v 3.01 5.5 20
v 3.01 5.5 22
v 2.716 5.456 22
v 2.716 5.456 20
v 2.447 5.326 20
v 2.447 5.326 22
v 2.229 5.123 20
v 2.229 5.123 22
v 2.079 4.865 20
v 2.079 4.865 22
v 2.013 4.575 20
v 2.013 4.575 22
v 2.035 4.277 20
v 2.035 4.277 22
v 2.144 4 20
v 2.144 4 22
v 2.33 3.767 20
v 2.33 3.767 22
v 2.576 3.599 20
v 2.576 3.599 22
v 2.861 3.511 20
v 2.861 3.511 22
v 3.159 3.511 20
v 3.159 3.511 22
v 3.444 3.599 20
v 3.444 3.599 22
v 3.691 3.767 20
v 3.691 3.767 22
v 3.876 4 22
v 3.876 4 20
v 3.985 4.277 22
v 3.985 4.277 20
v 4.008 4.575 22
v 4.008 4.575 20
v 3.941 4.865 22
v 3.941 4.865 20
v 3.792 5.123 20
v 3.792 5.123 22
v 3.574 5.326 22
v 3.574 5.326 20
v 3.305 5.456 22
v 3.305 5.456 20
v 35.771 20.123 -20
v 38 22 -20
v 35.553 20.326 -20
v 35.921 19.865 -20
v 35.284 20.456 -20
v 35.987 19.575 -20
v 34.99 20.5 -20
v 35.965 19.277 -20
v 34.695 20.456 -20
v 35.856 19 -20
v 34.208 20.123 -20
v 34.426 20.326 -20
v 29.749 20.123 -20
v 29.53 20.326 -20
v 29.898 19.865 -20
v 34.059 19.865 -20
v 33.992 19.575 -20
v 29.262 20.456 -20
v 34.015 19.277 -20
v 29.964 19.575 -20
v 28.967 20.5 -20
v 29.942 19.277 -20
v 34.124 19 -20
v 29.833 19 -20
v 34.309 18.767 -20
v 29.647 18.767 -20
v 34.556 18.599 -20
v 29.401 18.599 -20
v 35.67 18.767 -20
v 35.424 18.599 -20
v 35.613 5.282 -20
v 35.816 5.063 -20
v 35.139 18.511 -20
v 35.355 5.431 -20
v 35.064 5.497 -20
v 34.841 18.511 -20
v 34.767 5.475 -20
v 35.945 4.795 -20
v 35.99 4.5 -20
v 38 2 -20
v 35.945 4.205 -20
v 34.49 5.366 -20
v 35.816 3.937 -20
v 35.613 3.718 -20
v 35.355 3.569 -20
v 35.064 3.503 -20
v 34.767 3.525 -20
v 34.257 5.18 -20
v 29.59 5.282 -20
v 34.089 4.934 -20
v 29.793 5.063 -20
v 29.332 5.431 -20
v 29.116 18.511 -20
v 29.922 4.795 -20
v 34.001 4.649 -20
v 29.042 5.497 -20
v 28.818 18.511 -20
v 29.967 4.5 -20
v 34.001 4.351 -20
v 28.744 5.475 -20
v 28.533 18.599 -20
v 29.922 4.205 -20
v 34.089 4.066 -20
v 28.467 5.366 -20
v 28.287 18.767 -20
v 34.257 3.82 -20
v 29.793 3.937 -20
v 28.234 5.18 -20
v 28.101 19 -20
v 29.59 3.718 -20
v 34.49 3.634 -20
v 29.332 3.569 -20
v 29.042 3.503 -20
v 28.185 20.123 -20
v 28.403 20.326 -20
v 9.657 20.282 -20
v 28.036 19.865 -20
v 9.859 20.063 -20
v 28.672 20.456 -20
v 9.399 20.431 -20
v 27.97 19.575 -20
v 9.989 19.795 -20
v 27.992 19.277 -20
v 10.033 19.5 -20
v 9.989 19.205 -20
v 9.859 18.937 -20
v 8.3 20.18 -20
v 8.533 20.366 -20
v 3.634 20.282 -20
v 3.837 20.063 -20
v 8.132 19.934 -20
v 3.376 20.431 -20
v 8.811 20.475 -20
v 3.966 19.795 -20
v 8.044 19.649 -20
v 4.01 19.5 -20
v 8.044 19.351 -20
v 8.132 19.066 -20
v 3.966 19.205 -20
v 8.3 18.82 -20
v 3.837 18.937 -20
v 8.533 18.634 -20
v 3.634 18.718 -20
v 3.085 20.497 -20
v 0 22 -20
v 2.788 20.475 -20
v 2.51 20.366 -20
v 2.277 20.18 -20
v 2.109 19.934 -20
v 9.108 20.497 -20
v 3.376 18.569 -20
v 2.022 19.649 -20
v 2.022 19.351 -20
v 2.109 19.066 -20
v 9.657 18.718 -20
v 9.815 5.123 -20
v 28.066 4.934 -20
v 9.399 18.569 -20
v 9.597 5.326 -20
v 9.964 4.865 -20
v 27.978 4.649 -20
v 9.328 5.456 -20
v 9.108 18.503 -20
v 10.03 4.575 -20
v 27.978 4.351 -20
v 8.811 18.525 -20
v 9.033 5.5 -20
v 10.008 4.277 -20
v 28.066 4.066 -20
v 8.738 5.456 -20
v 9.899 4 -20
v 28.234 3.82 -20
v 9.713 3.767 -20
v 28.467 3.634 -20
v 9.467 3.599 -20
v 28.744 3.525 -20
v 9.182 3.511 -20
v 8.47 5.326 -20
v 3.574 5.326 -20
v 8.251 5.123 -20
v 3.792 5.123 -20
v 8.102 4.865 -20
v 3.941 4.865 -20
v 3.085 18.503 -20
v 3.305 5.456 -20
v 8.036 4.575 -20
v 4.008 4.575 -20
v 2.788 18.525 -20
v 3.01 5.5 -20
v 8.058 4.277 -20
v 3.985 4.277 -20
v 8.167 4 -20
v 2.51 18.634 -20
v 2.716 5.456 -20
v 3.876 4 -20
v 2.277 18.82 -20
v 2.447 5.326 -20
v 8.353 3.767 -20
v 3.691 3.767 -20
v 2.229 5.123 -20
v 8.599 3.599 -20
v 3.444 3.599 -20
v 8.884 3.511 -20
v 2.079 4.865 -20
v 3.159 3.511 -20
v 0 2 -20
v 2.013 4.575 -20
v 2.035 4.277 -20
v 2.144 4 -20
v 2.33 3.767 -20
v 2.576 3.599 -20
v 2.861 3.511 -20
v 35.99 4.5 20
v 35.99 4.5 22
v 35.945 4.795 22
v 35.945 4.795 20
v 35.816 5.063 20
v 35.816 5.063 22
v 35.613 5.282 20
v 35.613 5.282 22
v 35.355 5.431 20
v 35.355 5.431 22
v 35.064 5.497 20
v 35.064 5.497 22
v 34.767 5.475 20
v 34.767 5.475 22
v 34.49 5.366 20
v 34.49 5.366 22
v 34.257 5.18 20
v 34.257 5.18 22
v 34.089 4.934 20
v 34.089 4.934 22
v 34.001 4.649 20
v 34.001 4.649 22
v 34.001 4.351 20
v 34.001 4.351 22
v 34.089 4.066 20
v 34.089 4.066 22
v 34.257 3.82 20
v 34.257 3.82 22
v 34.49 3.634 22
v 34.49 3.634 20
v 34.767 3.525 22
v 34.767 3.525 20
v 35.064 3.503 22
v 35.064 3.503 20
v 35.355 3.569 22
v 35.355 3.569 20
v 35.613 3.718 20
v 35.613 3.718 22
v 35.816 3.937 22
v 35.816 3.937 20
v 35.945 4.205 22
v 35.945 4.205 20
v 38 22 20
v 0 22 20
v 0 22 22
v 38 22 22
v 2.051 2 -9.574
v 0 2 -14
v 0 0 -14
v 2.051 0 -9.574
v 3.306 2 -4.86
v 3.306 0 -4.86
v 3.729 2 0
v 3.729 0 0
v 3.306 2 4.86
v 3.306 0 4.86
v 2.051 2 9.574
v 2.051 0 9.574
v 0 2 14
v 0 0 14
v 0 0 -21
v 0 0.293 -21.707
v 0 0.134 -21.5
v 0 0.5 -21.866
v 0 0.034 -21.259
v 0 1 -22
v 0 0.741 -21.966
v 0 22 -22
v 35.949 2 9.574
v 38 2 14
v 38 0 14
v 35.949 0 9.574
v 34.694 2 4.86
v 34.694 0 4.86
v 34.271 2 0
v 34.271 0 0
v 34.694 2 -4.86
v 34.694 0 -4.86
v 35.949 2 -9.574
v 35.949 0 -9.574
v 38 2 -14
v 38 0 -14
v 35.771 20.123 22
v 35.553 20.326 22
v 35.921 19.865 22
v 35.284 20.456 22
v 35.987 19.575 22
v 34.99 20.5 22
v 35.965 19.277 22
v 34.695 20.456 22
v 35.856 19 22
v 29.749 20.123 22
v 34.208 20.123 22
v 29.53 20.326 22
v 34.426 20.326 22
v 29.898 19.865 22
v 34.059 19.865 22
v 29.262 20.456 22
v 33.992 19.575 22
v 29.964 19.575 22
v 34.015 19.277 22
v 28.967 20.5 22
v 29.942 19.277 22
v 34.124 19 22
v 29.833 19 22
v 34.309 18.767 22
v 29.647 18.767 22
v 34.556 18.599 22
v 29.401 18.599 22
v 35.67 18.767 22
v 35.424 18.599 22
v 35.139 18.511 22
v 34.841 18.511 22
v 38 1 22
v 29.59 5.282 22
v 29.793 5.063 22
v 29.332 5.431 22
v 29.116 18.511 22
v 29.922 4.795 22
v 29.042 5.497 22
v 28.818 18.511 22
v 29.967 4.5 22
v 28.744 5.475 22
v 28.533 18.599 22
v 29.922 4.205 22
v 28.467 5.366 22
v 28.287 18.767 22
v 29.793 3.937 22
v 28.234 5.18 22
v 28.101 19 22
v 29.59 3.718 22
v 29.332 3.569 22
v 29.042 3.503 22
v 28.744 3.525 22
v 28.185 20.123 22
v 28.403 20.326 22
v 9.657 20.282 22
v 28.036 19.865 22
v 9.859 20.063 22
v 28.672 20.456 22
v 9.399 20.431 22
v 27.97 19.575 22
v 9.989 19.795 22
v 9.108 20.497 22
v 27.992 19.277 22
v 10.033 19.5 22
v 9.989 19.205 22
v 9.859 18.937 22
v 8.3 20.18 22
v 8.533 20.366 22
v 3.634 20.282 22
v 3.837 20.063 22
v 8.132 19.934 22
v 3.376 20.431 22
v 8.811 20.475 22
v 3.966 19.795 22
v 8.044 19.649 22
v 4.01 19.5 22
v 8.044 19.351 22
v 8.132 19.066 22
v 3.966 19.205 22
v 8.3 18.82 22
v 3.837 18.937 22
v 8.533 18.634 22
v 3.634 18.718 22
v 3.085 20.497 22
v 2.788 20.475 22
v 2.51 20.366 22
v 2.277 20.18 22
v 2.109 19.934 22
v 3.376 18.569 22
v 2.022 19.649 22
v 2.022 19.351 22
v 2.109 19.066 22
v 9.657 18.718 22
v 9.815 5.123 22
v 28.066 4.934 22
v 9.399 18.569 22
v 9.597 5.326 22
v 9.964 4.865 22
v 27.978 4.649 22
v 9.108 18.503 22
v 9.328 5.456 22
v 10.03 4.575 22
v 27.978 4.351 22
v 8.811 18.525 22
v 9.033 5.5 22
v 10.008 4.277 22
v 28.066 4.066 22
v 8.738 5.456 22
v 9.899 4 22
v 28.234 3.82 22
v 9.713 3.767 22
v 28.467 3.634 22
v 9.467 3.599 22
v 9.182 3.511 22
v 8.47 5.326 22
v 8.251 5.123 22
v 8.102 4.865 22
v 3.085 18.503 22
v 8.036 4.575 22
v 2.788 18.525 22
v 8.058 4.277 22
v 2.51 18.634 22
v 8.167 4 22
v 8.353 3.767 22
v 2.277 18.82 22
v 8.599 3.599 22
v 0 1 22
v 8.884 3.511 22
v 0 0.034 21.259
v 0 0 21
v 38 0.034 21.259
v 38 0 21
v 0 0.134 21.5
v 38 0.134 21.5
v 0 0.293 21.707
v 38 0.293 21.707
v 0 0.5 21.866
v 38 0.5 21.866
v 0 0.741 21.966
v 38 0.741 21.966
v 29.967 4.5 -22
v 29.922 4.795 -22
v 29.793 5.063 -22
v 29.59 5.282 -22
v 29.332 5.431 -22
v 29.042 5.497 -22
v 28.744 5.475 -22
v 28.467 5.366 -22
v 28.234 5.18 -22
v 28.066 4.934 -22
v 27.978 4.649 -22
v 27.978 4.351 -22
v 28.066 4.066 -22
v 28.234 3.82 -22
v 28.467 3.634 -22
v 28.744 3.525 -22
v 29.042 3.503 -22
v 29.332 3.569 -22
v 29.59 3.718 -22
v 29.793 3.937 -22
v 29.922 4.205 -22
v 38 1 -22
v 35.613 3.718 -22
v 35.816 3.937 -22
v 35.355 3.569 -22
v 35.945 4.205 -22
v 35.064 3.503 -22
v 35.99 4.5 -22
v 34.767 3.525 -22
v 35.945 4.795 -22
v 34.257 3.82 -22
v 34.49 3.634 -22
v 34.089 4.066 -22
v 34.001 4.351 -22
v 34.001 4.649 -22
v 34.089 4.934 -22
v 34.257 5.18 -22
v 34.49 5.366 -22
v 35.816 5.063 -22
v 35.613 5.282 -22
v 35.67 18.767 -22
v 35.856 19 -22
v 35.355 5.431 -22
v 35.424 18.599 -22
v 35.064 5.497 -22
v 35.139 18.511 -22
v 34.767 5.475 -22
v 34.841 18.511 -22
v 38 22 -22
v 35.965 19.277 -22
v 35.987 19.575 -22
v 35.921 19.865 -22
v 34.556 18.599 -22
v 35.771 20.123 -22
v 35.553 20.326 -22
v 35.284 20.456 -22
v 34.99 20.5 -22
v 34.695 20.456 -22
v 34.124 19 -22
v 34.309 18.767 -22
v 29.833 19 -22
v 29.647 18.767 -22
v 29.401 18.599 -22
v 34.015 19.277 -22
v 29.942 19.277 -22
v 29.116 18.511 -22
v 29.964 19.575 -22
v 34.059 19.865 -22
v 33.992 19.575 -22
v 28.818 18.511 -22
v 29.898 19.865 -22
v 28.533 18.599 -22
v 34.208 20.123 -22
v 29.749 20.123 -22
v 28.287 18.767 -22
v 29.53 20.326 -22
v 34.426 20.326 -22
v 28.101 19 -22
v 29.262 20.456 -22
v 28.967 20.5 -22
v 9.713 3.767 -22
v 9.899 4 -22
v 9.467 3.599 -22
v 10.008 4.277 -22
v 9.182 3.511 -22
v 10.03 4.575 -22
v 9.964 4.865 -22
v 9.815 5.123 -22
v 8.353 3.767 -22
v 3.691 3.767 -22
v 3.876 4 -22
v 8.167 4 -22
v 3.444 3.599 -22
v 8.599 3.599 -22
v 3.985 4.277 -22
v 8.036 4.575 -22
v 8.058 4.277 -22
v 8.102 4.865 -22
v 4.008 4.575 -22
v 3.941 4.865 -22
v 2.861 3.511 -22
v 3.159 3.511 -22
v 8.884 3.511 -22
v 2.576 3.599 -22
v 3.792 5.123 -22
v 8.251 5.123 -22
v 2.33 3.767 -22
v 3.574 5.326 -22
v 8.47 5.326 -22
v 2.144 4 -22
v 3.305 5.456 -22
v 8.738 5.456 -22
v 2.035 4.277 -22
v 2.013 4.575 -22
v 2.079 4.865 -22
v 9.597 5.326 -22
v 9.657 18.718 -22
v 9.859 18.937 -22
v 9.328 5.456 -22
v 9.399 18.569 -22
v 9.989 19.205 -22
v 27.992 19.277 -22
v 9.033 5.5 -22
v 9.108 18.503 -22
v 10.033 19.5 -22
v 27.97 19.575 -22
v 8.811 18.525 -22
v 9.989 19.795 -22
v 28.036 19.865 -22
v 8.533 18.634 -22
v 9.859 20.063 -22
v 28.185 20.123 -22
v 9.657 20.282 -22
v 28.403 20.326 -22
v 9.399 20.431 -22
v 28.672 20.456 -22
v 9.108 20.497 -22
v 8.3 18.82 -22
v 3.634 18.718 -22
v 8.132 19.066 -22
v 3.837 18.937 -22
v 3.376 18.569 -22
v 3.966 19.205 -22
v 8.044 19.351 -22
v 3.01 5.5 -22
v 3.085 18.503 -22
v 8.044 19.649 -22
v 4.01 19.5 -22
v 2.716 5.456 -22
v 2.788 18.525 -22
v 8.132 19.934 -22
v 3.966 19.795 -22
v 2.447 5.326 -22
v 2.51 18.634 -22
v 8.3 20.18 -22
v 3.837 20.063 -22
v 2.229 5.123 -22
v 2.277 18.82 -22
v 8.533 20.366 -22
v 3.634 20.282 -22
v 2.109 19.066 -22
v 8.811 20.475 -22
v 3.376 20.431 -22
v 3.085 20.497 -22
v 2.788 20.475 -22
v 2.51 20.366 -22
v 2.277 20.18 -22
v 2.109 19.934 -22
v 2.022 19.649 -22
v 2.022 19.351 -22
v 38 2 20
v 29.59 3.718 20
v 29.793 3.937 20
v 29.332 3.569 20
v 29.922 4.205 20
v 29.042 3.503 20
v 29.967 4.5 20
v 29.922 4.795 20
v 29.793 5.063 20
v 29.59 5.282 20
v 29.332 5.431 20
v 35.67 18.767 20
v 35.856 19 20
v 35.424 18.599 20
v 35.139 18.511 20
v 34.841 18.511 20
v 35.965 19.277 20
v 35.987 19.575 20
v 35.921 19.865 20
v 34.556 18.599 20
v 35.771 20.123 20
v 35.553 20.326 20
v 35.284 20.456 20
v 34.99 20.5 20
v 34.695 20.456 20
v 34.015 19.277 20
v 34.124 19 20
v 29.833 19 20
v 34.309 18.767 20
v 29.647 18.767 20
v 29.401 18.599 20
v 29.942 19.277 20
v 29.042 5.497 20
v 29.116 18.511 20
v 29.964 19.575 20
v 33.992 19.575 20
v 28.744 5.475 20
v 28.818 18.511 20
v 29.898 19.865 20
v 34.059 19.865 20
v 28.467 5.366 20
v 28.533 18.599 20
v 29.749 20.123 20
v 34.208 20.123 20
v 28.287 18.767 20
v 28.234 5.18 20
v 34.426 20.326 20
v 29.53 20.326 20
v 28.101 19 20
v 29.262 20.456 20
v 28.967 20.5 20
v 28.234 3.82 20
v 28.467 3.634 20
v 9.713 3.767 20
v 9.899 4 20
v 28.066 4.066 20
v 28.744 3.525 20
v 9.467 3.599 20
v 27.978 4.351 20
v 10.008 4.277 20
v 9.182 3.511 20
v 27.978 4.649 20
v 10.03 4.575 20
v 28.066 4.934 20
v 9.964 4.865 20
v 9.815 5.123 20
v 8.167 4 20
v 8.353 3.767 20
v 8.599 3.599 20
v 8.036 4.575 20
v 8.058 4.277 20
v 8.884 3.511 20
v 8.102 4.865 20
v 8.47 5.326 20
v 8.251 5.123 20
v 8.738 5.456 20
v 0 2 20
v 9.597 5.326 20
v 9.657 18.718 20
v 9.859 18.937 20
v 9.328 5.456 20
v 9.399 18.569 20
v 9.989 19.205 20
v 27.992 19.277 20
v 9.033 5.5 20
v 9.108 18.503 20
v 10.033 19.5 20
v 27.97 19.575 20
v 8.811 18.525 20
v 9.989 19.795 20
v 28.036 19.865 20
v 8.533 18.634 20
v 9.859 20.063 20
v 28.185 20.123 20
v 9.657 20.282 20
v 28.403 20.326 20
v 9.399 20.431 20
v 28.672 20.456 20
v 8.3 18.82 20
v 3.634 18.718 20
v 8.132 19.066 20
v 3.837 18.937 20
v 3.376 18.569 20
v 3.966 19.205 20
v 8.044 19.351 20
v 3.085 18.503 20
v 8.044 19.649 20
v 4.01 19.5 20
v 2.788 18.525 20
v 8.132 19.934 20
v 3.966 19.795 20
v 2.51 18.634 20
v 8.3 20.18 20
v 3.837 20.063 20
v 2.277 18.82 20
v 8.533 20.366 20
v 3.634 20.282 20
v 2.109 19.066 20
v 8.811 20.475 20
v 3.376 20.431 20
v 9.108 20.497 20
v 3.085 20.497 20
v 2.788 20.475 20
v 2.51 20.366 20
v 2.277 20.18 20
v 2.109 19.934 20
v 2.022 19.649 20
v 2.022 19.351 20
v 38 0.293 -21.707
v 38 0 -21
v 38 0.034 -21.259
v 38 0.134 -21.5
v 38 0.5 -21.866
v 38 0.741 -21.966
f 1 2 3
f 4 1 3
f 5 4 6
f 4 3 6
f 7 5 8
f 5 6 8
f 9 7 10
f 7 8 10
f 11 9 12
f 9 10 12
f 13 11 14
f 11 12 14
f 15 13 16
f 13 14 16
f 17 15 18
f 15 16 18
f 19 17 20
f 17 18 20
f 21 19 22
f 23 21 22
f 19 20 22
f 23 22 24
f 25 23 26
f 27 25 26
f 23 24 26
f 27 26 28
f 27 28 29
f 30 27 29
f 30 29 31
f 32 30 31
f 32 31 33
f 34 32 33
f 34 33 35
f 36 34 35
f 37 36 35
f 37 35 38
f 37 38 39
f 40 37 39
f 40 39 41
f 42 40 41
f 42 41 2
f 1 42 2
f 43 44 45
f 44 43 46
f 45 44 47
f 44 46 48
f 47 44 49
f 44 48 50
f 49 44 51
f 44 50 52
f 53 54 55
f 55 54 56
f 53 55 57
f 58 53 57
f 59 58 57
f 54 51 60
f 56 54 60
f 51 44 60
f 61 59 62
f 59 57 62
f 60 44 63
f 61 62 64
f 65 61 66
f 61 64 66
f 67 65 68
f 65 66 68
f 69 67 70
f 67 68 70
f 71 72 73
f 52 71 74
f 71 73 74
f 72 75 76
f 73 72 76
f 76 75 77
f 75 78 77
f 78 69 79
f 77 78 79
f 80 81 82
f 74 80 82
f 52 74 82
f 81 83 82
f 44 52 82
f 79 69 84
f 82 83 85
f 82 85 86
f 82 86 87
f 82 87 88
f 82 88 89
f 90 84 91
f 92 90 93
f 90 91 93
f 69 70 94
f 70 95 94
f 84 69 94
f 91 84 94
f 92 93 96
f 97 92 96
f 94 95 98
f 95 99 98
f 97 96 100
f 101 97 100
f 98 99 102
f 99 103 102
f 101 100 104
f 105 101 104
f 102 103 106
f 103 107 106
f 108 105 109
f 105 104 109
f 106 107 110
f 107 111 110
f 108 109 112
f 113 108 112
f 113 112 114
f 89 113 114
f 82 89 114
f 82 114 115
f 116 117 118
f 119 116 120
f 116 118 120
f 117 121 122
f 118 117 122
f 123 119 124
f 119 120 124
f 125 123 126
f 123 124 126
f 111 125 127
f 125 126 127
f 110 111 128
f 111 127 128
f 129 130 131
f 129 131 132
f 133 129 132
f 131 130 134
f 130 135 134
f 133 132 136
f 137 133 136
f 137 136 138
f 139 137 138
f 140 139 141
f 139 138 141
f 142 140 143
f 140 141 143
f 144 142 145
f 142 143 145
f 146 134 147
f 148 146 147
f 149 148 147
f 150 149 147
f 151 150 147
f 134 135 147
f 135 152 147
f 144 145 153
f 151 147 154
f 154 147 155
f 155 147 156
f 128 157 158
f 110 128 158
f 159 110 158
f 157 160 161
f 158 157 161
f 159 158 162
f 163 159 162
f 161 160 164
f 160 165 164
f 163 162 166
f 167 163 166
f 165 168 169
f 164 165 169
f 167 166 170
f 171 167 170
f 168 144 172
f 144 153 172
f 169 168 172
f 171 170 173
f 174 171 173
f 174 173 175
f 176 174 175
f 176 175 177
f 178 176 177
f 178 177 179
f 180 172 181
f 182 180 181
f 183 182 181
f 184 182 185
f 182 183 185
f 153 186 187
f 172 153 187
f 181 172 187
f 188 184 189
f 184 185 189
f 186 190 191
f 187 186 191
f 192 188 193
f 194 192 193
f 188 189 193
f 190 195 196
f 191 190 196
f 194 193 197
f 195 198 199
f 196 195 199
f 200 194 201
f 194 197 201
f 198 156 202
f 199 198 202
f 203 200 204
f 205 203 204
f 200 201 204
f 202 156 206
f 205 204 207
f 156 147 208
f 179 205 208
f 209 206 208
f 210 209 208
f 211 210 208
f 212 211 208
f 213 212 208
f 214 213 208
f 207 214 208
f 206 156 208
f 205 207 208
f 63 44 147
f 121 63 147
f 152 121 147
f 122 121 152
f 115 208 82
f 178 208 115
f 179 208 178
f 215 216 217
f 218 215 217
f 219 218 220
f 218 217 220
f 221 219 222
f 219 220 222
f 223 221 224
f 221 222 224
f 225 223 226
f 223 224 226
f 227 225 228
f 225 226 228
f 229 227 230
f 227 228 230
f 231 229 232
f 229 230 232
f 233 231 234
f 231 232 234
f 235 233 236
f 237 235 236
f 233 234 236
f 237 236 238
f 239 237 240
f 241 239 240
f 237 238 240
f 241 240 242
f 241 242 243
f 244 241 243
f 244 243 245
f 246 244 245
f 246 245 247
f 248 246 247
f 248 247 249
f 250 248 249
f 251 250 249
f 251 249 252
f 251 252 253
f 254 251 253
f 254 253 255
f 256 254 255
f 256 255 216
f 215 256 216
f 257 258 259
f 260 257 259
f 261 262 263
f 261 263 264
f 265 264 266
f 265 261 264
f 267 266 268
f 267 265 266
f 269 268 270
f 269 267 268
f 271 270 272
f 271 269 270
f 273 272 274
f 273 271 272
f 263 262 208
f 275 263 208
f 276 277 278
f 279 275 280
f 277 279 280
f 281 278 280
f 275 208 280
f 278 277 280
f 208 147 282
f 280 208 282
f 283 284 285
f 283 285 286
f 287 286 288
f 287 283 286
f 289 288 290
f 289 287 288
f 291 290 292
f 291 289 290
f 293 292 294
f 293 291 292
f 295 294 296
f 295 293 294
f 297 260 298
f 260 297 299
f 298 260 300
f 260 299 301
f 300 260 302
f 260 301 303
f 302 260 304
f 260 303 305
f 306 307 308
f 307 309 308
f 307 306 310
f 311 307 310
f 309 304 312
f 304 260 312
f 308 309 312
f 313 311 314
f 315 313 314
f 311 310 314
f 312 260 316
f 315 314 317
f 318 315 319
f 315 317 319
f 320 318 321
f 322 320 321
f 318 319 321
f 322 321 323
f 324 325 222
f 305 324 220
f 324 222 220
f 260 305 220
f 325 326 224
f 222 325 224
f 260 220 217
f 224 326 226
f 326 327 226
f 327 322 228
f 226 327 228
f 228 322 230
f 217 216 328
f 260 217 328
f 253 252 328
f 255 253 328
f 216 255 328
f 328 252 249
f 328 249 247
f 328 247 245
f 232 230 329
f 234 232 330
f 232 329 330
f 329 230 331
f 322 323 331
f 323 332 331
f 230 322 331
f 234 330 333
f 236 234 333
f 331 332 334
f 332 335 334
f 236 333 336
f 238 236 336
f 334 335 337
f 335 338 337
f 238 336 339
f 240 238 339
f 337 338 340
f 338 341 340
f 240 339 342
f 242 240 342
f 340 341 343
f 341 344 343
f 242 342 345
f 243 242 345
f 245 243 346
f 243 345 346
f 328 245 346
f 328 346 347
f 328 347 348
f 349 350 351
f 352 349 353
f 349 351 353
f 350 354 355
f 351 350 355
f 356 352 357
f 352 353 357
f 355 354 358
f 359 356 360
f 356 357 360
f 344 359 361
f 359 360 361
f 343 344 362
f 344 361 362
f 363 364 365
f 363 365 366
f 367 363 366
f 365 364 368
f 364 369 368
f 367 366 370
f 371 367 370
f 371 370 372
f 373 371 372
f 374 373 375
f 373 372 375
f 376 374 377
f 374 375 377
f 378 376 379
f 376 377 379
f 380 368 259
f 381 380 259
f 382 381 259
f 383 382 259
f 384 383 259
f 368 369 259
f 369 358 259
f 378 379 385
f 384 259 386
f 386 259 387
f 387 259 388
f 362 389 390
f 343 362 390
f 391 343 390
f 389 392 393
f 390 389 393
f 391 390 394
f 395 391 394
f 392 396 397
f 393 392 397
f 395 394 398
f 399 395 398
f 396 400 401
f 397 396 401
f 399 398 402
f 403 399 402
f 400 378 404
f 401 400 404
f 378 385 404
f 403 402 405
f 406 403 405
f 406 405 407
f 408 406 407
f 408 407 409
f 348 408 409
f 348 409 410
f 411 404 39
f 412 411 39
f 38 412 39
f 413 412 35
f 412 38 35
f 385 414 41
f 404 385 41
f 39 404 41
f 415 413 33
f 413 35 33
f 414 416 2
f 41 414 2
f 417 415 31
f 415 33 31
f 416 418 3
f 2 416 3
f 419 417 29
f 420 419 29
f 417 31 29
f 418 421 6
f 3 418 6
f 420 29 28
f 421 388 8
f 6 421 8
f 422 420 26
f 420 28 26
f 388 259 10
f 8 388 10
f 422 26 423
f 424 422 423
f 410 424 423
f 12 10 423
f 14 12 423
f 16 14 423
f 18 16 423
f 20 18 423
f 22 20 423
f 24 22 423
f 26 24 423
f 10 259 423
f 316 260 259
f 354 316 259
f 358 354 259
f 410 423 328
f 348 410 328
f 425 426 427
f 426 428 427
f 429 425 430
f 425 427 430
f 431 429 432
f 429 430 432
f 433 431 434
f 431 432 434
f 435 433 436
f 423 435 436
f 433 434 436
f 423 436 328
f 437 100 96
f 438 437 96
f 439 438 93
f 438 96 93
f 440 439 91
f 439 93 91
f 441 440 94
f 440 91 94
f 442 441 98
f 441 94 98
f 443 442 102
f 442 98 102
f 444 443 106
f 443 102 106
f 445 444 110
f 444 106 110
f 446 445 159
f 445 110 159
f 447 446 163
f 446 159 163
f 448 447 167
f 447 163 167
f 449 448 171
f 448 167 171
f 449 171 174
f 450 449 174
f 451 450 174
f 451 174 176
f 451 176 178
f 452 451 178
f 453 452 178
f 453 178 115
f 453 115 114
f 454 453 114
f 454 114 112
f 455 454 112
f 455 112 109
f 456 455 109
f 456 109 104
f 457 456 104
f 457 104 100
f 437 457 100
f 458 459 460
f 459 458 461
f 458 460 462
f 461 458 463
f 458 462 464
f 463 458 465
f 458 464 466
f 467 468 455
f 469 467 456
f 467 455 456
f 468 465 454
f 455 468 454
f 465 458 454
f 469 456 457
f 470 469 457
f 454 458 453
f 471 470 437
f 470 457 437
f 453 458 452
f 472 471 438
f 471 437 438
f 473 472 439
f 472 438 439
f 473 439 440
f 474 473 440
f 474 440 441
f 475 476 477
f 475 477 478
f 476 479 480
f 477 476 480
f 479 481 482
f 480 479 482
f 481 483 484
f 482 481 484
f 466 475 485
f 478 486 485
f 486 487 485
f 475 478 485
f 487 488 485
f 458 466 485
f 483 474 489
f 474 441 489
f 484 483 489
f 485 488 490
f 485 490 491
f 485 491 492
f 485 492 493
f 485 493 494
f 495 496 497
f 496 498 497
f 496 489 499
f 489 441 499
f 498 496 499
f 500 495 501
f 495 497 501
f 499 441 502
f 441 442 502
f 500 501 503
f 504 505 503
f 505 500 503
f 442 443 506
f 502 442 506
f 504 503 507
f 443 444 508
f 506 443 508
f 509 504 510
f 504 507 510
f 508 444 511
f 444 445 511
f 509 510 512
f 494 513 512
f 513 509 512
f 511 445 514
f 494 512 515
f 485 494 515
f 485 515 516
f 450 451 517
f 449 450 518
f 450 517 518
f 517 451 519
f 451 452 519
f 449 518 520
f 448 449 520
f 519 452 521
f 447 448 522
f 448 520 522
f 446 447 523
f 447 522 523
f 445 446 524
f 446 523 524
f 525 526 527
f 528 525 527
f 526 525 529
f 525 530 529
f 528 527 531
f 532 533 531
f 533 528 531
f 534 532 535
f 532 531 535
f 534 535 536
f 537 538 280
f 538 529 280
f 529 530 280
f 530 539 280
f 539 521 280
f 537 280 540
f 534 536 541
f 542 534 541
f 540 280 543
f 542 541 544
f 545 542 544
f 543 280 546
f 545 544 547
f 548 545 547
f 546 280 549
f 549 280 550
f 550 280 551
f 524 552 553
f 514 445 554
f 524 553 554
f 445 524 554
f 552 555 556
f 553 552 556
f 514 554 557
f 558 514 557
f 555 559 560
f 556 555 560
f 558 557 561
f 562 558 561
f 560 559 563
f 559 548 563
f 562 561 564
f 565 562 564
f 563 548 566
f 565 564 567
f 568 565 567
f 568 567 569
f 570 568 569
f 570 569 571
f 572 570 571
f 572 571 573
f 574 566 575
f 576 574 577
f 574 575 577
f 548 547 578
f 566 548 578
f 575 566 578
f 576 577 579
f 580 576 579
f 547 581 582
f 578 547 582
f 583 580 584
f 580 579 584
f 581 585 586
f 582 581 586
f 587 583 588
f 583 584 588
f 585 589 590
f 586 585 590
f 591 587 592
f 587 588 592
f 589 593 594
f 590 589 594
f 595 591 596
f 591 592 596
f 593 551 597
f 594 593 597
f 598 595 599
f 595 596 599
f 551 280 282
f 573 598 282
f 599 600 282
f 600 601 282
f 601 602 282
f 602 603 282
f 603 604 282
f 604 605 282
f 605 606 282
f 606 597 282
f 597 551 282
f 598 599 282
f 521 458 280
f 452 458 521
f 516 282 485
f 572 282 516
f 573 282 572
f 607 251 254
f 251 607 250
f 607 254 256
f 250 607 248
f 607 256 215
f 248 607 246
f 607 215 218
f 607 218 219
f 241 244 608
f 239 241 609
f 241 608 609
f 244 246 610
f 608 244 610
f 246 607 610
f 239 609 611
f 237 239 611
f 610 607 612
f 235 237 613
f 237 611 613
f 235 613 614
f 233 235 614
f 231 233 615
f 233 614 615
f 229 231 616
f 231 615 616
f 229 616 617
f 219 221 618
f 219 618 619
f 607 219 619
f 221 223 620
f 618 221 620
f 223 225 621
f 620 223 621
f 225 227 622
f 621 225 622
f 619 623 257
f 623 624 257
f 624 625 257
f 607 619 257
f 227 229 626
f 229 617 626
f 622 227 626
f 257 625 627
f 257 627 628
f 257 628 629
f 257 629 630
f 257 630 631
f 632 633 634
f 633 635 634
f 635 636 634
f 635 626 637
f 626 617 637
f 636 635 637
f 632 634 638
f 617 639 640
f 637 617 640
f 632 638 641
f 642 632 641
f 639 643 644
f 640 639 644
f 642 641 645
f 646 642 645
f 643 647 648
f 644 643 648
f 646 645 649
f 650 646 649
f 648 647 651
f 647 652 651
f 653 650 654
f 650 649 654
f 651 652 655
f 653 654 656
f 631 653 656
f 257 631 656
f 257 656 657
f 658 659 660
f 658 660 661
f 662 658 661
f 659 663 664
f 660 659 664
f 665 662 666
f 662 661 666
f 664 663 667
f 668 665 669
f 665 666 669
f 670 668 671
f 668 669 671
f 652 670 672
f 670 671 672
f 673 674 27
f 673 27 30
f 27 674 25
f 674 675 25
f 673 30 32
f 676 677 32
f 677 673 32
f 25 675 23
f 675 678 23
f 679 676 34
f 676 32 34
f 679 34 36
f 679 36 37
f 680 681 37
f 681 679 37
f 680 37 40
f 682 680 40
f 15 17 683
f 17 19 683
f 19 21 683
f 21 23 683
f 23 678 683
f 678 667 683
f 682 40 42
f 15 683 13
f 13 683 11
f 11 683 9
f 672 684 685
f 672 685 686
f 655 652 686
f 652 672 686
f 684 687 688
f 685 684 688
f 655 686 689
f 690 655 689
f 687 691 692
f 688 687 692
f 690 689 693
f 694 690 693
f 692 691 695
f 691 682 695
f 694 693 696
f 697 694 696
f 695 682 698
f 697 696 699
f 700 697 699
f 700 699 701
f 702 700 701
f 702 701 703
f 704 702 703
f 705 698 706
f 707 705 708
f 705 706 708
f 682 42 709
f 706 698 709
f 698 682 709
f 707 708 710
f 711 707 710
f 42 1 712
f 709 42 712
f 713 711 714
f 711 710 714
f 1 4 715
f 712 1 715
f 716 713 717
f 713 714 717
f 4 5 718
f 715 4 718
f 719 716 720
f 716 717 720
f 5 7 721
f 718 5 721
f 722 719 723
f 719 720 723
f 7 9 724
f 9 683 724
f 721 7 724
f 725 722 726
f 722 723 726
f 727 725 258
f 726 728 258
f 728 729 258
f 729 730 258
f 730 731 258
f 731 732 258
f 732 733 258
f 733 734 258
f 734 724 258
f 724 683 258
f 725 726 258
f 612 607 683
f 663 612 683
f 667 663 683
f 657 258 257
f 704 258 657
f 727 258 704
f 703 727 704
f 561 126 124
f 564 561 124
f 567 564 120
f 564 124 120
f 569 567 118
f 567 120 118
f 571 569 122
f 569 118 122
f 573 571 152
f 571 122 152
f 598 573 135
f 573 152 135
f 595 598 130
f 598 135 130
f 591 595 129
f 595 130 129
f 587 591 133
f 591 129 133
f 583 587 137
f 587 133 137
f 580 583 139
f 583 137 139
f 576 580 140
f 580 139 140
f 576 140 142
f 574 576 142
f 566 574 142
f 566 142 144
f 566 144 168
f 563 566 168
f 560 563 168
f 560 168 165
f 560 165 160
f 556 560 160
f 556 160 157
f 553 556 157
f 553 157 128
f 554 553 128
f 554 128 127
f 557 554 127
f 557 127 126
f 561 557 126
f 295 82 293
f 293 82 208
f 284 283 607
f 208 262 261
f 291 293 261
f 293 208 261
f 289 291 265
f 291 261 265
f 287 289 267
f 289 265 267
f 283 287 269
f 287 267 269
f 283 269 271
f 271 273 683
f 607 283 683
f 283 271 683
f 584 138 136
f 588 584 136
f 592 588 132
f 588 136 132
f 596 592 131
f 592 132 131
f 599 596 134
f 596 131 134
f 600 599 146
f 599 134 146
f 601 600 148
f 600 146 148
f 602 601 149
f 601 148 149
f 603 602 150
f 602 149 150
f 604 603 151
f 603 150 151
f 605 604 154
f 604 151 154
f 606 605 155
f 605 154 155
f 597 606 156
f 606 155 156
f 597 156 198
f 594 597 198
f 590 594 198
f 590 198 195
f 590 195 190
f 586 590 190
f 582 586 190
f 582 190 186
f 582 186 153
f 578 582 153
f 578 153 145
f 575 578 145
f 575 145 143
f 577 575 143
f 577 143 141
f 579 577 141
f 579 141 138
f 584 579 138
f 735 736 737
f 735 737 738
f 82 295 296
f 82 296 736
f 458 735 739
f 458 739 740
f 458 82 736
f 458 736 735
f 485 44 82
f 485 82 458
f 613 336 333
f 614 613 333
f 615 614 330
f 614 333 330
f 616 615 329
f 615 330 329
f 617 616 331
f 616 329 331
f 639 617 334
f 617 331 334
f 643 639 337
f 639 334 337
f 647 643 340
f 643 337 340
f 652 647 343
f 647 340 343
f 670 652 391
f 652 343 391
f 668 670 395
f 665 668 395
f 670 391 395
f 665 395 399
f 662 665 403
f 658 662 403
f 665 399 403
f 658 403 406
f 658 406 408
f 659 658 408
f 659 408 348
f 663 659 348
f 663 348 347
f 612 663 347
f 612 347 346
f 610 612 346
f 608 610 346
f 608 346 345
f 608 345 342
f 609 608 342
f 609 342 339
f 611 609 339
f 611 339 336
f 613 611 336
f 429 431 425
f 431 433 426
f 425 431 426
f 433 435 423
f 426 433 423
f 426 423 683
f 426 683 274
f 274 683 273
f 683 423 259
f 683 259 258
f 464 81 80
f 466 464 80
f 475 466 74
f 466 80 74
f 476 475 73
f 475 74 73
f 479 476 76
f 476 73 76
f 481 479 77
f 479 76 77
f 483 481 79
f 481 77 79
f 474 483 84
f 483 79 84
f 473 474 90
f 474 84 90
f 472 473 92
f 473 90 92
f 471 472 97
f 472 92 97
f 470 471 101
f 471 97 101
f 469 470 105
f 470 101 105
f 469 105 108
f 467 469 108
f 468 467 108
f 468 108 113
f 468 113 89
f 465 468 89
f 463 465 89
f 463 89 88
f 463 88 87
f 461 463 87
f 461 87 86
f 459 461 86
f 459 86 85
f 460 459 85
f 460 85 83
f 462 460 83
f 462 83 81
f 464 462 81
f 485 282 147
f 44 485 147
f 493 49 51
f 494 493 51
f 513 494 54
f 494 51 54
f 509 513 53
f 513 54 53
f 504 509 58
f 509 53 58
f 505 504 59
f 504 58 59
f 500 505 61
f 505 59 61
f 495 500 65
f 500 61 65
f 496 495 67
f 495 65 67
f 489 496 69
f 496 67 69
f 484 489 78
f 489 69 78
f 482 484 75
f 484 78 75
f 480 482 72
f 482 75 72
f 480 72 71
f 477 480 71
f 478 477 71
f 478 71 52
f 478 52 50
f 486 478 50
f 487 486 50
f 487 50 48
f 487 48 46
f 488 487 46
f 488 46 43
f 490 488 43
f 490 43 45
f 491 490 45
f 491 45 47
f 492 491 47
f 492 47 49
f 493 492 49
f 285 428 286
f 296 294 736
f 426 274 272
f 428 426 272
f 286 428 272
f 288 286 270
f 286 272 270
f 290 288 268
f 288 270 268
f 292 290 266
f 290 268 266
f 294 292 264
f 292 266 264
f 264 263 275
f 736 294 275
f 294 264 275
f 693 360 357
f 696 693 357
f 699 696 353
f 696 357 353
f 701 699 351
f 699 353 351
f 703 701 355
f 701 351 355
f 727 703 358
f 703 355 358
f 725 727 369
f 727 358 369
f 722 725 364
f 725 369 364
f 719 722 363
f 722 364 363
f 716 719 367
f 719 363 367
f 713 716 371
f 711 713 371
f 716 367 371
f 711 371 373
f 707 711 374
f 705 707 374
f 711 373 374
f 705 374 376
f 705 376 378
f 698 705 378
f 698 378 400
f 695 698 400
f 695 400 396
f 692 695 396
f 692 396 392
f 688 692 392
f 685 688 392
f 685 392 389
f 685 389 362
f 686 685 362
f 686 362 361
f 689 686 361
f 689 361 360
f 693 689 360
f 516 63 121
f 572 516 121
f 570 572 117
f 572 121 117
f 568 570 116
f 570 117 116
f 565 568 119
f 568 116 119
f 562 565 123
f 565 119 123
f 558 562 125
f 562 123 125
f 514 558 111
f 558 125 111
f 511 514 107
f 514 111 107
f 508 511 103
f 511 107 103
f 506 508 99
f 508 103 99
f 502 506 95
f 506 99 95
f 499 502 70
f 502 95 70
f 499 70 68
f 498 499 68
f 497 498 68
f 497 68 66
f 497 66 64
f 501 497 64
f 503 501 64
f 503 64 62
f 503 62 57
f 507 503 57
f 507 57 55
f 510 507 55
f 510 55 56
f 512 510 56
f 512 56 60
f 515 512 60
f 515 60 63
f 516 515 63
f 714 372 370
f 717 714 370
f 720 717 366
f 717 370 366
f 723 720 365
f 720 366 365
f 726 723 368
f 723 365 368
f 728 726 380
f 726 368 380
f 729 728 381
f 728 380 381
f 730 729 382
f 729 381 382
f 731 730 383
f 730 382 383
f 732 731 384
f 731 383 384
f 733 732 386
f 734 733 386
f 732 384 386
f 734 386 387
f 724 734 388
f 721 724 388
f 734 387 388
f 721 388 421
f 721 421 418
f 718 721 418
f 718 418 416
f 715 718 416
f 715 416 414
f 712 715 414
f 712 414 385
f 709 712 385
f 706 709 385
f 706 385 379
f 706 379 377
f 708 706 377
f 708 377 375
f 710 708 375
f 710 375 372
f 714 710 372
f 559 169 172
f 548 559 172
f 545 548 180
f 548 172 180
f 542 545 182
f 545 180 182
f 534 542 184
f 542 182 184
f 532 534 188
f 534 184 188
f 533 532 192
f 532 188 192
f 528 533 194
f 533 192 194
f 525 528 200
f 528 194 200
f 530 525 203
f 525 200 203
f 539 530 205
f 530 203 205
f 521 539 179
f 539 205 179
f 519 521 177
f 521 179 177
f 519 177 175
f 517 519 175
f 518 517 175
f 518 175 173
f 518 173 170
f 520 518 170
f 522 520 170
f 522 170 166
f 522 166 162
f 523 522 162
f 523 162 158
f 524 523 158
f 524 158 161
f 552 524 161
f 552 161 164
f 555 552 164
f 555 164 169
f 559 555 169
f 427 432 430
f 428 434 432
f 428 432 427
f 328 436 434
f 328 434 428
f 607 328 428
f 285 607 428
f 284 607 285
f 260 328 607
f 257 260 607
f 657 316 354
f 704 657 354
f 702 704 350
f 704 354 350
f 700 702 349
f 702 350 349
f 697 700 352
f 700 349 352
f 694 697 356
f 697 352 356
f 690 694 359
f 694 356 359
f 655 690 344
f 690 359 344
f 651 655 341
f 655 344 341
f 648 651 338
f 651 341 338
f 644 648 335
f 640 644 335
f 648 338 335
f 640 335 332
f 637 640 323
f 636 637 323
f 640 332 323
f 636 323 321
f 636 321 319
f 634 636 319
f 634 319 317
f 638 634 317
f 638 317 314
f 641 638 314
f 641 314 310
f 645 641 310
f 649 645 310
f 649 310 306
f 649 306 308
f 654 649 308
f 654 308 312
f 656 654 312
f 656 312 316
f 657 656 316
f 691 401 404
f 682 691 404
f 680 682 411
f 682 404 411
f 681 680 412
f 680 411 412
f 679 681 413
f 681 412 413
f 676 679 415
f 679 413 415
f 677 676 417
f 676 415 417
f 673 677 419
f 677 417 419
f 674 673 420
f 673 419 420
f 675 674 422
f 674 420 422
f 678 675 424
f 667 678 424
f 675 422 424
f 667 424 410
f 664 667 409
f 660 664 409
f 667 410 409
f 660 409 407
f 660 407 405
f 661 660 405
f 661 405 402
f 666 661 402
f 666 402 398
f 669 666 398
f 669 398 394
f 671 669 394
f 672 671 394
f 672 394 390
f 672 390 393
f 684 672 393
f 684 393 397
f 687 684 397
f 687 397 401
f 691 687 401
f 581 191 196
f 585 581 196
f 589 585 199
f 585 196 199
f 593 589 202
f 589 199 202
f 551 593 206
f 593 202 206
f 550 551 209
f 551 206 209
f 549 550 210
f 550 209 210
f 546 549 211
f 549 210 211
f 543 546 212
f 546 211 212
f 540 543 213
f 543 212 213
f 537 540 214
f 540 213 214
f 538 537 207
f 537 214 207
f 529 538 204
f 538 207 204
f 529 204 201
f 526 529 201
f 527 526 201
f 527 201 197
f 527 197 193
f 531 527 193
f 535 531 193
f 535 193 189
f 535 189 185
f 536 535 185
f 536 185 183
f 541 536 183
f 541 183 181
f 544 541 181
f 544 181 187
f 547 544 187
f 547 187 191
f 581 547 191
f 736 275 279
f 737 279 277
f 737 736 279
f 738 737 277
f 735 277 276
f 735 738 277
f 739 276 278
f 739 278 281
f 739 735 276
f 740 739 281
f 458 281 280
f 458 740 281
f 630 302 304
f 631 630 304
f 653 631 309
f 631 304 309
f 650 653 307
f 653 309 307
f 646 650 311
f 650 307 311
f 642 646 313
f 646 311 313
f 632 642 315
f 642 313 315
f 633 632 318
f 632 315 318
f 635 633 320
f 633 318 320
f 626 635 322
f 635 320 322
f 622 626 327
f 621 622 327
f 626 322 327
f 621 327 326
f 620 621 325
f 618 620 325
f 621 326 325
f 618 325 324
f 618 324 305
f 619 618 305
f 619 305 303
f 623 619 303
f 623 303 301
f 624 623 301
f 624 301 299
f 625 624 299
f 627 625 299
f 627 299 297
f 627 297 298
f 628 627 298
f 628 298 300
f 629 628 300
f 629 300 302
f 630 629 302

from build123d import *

# Parameters (mm, degrees)
EXTRUDE_1_DEPTH     = 38
CUT_EXTRUDE_1_DEPTH = 38
SKETCH_4_R          = 1
CUT_EXTRUDE_3_DEPTH = 68
FILLET_1_R          = 1


with BuildPart() as part:
    # ｽｹｯﾁ1 → ﾎﾞｽ - 押し出し1 (new body)
    with BuildSketch(Plane(origin=(0, 0, 0), x_dir=(0, 0, -1), z_dir=(1, 0, 0))):
        Polygon((-22, 0), (22, 0), (22, 22), (20, 22), (20, 2), (-20, 2), (-20, 22), (-22, 22), align=None)
    extrude(amount=EXTRUDE_1_DEPTH)

    # ｽｹｯﾁ3 → ｶｯﾄ - 押し出し1 (cut)
    with BuildSketch(Plane(origin=(0, 12, 0), x_dir=(1, 0, 0), z_dir=(0, 1, 0))):
        with BuildLine():
            ThreePointArc((0, 14), (3.728865695, 0), (0, -14))
            Line((0, -14), (0, 14))
        make_face()
        with BuildLine():
            Line((38, 14), (38, -14))
            ThreePointArc((38, -14), (34.271134305, 0), (38, 14))
        make_face()
    extrude(amount=-CUT_EXTRUDE_1_DEPTH, mode=Mode.SUBTRACT)

    # ｽｹｯﾁ4 → ｶｯﾄ - 押し出し3 (cut)
    with BuildSketch(Plane.XY.offset(22)):
        with Locations((3.010351423, 19.5)):
            Circle(SKETCH_4_R)
        with Locations((9.033182751, 19.5)):
            Circle(SKETCH_4_R)
        with Locations(Location((3.010351423, 4.5, 0), (0, 0, 90))):
            Circle(SKETCH_4_R)
        with Locations(Location((9.033182751, 4.5, 0), (0, 0, 90))):
            Circle(SKETCH_4_R)
        with Locations(Location((28.966817249, 19.5, 0), (0, 0, 90))):
            Circle(SKETCH_4_R)
        with Locations(Location((34.989648577, 19.5, 0), (0, 0, 90))):
            Circle(SKETCH_4_R)
        with Locations((34.989648577, 4.5)):
            Circle(SKETCH_4_R)
        with Locations((28.966817249, 4.5)):
            Circle(SKETCH_4_R)
    extrude(amount=-CUT_EXTRUDE_3_DEPTH, mode=Mode.SUBTRACT)

    # ﾌｨﾚｯﾄ1
    fillet_1_edges = [part.edges().sort_by_distance(p)[0] for p in [
        (19, 0, 22),
        (19, 0, -22),
    ]]
    fillet(fillet_1_edges, radius=FILLET_1_R)


solid = part.part
